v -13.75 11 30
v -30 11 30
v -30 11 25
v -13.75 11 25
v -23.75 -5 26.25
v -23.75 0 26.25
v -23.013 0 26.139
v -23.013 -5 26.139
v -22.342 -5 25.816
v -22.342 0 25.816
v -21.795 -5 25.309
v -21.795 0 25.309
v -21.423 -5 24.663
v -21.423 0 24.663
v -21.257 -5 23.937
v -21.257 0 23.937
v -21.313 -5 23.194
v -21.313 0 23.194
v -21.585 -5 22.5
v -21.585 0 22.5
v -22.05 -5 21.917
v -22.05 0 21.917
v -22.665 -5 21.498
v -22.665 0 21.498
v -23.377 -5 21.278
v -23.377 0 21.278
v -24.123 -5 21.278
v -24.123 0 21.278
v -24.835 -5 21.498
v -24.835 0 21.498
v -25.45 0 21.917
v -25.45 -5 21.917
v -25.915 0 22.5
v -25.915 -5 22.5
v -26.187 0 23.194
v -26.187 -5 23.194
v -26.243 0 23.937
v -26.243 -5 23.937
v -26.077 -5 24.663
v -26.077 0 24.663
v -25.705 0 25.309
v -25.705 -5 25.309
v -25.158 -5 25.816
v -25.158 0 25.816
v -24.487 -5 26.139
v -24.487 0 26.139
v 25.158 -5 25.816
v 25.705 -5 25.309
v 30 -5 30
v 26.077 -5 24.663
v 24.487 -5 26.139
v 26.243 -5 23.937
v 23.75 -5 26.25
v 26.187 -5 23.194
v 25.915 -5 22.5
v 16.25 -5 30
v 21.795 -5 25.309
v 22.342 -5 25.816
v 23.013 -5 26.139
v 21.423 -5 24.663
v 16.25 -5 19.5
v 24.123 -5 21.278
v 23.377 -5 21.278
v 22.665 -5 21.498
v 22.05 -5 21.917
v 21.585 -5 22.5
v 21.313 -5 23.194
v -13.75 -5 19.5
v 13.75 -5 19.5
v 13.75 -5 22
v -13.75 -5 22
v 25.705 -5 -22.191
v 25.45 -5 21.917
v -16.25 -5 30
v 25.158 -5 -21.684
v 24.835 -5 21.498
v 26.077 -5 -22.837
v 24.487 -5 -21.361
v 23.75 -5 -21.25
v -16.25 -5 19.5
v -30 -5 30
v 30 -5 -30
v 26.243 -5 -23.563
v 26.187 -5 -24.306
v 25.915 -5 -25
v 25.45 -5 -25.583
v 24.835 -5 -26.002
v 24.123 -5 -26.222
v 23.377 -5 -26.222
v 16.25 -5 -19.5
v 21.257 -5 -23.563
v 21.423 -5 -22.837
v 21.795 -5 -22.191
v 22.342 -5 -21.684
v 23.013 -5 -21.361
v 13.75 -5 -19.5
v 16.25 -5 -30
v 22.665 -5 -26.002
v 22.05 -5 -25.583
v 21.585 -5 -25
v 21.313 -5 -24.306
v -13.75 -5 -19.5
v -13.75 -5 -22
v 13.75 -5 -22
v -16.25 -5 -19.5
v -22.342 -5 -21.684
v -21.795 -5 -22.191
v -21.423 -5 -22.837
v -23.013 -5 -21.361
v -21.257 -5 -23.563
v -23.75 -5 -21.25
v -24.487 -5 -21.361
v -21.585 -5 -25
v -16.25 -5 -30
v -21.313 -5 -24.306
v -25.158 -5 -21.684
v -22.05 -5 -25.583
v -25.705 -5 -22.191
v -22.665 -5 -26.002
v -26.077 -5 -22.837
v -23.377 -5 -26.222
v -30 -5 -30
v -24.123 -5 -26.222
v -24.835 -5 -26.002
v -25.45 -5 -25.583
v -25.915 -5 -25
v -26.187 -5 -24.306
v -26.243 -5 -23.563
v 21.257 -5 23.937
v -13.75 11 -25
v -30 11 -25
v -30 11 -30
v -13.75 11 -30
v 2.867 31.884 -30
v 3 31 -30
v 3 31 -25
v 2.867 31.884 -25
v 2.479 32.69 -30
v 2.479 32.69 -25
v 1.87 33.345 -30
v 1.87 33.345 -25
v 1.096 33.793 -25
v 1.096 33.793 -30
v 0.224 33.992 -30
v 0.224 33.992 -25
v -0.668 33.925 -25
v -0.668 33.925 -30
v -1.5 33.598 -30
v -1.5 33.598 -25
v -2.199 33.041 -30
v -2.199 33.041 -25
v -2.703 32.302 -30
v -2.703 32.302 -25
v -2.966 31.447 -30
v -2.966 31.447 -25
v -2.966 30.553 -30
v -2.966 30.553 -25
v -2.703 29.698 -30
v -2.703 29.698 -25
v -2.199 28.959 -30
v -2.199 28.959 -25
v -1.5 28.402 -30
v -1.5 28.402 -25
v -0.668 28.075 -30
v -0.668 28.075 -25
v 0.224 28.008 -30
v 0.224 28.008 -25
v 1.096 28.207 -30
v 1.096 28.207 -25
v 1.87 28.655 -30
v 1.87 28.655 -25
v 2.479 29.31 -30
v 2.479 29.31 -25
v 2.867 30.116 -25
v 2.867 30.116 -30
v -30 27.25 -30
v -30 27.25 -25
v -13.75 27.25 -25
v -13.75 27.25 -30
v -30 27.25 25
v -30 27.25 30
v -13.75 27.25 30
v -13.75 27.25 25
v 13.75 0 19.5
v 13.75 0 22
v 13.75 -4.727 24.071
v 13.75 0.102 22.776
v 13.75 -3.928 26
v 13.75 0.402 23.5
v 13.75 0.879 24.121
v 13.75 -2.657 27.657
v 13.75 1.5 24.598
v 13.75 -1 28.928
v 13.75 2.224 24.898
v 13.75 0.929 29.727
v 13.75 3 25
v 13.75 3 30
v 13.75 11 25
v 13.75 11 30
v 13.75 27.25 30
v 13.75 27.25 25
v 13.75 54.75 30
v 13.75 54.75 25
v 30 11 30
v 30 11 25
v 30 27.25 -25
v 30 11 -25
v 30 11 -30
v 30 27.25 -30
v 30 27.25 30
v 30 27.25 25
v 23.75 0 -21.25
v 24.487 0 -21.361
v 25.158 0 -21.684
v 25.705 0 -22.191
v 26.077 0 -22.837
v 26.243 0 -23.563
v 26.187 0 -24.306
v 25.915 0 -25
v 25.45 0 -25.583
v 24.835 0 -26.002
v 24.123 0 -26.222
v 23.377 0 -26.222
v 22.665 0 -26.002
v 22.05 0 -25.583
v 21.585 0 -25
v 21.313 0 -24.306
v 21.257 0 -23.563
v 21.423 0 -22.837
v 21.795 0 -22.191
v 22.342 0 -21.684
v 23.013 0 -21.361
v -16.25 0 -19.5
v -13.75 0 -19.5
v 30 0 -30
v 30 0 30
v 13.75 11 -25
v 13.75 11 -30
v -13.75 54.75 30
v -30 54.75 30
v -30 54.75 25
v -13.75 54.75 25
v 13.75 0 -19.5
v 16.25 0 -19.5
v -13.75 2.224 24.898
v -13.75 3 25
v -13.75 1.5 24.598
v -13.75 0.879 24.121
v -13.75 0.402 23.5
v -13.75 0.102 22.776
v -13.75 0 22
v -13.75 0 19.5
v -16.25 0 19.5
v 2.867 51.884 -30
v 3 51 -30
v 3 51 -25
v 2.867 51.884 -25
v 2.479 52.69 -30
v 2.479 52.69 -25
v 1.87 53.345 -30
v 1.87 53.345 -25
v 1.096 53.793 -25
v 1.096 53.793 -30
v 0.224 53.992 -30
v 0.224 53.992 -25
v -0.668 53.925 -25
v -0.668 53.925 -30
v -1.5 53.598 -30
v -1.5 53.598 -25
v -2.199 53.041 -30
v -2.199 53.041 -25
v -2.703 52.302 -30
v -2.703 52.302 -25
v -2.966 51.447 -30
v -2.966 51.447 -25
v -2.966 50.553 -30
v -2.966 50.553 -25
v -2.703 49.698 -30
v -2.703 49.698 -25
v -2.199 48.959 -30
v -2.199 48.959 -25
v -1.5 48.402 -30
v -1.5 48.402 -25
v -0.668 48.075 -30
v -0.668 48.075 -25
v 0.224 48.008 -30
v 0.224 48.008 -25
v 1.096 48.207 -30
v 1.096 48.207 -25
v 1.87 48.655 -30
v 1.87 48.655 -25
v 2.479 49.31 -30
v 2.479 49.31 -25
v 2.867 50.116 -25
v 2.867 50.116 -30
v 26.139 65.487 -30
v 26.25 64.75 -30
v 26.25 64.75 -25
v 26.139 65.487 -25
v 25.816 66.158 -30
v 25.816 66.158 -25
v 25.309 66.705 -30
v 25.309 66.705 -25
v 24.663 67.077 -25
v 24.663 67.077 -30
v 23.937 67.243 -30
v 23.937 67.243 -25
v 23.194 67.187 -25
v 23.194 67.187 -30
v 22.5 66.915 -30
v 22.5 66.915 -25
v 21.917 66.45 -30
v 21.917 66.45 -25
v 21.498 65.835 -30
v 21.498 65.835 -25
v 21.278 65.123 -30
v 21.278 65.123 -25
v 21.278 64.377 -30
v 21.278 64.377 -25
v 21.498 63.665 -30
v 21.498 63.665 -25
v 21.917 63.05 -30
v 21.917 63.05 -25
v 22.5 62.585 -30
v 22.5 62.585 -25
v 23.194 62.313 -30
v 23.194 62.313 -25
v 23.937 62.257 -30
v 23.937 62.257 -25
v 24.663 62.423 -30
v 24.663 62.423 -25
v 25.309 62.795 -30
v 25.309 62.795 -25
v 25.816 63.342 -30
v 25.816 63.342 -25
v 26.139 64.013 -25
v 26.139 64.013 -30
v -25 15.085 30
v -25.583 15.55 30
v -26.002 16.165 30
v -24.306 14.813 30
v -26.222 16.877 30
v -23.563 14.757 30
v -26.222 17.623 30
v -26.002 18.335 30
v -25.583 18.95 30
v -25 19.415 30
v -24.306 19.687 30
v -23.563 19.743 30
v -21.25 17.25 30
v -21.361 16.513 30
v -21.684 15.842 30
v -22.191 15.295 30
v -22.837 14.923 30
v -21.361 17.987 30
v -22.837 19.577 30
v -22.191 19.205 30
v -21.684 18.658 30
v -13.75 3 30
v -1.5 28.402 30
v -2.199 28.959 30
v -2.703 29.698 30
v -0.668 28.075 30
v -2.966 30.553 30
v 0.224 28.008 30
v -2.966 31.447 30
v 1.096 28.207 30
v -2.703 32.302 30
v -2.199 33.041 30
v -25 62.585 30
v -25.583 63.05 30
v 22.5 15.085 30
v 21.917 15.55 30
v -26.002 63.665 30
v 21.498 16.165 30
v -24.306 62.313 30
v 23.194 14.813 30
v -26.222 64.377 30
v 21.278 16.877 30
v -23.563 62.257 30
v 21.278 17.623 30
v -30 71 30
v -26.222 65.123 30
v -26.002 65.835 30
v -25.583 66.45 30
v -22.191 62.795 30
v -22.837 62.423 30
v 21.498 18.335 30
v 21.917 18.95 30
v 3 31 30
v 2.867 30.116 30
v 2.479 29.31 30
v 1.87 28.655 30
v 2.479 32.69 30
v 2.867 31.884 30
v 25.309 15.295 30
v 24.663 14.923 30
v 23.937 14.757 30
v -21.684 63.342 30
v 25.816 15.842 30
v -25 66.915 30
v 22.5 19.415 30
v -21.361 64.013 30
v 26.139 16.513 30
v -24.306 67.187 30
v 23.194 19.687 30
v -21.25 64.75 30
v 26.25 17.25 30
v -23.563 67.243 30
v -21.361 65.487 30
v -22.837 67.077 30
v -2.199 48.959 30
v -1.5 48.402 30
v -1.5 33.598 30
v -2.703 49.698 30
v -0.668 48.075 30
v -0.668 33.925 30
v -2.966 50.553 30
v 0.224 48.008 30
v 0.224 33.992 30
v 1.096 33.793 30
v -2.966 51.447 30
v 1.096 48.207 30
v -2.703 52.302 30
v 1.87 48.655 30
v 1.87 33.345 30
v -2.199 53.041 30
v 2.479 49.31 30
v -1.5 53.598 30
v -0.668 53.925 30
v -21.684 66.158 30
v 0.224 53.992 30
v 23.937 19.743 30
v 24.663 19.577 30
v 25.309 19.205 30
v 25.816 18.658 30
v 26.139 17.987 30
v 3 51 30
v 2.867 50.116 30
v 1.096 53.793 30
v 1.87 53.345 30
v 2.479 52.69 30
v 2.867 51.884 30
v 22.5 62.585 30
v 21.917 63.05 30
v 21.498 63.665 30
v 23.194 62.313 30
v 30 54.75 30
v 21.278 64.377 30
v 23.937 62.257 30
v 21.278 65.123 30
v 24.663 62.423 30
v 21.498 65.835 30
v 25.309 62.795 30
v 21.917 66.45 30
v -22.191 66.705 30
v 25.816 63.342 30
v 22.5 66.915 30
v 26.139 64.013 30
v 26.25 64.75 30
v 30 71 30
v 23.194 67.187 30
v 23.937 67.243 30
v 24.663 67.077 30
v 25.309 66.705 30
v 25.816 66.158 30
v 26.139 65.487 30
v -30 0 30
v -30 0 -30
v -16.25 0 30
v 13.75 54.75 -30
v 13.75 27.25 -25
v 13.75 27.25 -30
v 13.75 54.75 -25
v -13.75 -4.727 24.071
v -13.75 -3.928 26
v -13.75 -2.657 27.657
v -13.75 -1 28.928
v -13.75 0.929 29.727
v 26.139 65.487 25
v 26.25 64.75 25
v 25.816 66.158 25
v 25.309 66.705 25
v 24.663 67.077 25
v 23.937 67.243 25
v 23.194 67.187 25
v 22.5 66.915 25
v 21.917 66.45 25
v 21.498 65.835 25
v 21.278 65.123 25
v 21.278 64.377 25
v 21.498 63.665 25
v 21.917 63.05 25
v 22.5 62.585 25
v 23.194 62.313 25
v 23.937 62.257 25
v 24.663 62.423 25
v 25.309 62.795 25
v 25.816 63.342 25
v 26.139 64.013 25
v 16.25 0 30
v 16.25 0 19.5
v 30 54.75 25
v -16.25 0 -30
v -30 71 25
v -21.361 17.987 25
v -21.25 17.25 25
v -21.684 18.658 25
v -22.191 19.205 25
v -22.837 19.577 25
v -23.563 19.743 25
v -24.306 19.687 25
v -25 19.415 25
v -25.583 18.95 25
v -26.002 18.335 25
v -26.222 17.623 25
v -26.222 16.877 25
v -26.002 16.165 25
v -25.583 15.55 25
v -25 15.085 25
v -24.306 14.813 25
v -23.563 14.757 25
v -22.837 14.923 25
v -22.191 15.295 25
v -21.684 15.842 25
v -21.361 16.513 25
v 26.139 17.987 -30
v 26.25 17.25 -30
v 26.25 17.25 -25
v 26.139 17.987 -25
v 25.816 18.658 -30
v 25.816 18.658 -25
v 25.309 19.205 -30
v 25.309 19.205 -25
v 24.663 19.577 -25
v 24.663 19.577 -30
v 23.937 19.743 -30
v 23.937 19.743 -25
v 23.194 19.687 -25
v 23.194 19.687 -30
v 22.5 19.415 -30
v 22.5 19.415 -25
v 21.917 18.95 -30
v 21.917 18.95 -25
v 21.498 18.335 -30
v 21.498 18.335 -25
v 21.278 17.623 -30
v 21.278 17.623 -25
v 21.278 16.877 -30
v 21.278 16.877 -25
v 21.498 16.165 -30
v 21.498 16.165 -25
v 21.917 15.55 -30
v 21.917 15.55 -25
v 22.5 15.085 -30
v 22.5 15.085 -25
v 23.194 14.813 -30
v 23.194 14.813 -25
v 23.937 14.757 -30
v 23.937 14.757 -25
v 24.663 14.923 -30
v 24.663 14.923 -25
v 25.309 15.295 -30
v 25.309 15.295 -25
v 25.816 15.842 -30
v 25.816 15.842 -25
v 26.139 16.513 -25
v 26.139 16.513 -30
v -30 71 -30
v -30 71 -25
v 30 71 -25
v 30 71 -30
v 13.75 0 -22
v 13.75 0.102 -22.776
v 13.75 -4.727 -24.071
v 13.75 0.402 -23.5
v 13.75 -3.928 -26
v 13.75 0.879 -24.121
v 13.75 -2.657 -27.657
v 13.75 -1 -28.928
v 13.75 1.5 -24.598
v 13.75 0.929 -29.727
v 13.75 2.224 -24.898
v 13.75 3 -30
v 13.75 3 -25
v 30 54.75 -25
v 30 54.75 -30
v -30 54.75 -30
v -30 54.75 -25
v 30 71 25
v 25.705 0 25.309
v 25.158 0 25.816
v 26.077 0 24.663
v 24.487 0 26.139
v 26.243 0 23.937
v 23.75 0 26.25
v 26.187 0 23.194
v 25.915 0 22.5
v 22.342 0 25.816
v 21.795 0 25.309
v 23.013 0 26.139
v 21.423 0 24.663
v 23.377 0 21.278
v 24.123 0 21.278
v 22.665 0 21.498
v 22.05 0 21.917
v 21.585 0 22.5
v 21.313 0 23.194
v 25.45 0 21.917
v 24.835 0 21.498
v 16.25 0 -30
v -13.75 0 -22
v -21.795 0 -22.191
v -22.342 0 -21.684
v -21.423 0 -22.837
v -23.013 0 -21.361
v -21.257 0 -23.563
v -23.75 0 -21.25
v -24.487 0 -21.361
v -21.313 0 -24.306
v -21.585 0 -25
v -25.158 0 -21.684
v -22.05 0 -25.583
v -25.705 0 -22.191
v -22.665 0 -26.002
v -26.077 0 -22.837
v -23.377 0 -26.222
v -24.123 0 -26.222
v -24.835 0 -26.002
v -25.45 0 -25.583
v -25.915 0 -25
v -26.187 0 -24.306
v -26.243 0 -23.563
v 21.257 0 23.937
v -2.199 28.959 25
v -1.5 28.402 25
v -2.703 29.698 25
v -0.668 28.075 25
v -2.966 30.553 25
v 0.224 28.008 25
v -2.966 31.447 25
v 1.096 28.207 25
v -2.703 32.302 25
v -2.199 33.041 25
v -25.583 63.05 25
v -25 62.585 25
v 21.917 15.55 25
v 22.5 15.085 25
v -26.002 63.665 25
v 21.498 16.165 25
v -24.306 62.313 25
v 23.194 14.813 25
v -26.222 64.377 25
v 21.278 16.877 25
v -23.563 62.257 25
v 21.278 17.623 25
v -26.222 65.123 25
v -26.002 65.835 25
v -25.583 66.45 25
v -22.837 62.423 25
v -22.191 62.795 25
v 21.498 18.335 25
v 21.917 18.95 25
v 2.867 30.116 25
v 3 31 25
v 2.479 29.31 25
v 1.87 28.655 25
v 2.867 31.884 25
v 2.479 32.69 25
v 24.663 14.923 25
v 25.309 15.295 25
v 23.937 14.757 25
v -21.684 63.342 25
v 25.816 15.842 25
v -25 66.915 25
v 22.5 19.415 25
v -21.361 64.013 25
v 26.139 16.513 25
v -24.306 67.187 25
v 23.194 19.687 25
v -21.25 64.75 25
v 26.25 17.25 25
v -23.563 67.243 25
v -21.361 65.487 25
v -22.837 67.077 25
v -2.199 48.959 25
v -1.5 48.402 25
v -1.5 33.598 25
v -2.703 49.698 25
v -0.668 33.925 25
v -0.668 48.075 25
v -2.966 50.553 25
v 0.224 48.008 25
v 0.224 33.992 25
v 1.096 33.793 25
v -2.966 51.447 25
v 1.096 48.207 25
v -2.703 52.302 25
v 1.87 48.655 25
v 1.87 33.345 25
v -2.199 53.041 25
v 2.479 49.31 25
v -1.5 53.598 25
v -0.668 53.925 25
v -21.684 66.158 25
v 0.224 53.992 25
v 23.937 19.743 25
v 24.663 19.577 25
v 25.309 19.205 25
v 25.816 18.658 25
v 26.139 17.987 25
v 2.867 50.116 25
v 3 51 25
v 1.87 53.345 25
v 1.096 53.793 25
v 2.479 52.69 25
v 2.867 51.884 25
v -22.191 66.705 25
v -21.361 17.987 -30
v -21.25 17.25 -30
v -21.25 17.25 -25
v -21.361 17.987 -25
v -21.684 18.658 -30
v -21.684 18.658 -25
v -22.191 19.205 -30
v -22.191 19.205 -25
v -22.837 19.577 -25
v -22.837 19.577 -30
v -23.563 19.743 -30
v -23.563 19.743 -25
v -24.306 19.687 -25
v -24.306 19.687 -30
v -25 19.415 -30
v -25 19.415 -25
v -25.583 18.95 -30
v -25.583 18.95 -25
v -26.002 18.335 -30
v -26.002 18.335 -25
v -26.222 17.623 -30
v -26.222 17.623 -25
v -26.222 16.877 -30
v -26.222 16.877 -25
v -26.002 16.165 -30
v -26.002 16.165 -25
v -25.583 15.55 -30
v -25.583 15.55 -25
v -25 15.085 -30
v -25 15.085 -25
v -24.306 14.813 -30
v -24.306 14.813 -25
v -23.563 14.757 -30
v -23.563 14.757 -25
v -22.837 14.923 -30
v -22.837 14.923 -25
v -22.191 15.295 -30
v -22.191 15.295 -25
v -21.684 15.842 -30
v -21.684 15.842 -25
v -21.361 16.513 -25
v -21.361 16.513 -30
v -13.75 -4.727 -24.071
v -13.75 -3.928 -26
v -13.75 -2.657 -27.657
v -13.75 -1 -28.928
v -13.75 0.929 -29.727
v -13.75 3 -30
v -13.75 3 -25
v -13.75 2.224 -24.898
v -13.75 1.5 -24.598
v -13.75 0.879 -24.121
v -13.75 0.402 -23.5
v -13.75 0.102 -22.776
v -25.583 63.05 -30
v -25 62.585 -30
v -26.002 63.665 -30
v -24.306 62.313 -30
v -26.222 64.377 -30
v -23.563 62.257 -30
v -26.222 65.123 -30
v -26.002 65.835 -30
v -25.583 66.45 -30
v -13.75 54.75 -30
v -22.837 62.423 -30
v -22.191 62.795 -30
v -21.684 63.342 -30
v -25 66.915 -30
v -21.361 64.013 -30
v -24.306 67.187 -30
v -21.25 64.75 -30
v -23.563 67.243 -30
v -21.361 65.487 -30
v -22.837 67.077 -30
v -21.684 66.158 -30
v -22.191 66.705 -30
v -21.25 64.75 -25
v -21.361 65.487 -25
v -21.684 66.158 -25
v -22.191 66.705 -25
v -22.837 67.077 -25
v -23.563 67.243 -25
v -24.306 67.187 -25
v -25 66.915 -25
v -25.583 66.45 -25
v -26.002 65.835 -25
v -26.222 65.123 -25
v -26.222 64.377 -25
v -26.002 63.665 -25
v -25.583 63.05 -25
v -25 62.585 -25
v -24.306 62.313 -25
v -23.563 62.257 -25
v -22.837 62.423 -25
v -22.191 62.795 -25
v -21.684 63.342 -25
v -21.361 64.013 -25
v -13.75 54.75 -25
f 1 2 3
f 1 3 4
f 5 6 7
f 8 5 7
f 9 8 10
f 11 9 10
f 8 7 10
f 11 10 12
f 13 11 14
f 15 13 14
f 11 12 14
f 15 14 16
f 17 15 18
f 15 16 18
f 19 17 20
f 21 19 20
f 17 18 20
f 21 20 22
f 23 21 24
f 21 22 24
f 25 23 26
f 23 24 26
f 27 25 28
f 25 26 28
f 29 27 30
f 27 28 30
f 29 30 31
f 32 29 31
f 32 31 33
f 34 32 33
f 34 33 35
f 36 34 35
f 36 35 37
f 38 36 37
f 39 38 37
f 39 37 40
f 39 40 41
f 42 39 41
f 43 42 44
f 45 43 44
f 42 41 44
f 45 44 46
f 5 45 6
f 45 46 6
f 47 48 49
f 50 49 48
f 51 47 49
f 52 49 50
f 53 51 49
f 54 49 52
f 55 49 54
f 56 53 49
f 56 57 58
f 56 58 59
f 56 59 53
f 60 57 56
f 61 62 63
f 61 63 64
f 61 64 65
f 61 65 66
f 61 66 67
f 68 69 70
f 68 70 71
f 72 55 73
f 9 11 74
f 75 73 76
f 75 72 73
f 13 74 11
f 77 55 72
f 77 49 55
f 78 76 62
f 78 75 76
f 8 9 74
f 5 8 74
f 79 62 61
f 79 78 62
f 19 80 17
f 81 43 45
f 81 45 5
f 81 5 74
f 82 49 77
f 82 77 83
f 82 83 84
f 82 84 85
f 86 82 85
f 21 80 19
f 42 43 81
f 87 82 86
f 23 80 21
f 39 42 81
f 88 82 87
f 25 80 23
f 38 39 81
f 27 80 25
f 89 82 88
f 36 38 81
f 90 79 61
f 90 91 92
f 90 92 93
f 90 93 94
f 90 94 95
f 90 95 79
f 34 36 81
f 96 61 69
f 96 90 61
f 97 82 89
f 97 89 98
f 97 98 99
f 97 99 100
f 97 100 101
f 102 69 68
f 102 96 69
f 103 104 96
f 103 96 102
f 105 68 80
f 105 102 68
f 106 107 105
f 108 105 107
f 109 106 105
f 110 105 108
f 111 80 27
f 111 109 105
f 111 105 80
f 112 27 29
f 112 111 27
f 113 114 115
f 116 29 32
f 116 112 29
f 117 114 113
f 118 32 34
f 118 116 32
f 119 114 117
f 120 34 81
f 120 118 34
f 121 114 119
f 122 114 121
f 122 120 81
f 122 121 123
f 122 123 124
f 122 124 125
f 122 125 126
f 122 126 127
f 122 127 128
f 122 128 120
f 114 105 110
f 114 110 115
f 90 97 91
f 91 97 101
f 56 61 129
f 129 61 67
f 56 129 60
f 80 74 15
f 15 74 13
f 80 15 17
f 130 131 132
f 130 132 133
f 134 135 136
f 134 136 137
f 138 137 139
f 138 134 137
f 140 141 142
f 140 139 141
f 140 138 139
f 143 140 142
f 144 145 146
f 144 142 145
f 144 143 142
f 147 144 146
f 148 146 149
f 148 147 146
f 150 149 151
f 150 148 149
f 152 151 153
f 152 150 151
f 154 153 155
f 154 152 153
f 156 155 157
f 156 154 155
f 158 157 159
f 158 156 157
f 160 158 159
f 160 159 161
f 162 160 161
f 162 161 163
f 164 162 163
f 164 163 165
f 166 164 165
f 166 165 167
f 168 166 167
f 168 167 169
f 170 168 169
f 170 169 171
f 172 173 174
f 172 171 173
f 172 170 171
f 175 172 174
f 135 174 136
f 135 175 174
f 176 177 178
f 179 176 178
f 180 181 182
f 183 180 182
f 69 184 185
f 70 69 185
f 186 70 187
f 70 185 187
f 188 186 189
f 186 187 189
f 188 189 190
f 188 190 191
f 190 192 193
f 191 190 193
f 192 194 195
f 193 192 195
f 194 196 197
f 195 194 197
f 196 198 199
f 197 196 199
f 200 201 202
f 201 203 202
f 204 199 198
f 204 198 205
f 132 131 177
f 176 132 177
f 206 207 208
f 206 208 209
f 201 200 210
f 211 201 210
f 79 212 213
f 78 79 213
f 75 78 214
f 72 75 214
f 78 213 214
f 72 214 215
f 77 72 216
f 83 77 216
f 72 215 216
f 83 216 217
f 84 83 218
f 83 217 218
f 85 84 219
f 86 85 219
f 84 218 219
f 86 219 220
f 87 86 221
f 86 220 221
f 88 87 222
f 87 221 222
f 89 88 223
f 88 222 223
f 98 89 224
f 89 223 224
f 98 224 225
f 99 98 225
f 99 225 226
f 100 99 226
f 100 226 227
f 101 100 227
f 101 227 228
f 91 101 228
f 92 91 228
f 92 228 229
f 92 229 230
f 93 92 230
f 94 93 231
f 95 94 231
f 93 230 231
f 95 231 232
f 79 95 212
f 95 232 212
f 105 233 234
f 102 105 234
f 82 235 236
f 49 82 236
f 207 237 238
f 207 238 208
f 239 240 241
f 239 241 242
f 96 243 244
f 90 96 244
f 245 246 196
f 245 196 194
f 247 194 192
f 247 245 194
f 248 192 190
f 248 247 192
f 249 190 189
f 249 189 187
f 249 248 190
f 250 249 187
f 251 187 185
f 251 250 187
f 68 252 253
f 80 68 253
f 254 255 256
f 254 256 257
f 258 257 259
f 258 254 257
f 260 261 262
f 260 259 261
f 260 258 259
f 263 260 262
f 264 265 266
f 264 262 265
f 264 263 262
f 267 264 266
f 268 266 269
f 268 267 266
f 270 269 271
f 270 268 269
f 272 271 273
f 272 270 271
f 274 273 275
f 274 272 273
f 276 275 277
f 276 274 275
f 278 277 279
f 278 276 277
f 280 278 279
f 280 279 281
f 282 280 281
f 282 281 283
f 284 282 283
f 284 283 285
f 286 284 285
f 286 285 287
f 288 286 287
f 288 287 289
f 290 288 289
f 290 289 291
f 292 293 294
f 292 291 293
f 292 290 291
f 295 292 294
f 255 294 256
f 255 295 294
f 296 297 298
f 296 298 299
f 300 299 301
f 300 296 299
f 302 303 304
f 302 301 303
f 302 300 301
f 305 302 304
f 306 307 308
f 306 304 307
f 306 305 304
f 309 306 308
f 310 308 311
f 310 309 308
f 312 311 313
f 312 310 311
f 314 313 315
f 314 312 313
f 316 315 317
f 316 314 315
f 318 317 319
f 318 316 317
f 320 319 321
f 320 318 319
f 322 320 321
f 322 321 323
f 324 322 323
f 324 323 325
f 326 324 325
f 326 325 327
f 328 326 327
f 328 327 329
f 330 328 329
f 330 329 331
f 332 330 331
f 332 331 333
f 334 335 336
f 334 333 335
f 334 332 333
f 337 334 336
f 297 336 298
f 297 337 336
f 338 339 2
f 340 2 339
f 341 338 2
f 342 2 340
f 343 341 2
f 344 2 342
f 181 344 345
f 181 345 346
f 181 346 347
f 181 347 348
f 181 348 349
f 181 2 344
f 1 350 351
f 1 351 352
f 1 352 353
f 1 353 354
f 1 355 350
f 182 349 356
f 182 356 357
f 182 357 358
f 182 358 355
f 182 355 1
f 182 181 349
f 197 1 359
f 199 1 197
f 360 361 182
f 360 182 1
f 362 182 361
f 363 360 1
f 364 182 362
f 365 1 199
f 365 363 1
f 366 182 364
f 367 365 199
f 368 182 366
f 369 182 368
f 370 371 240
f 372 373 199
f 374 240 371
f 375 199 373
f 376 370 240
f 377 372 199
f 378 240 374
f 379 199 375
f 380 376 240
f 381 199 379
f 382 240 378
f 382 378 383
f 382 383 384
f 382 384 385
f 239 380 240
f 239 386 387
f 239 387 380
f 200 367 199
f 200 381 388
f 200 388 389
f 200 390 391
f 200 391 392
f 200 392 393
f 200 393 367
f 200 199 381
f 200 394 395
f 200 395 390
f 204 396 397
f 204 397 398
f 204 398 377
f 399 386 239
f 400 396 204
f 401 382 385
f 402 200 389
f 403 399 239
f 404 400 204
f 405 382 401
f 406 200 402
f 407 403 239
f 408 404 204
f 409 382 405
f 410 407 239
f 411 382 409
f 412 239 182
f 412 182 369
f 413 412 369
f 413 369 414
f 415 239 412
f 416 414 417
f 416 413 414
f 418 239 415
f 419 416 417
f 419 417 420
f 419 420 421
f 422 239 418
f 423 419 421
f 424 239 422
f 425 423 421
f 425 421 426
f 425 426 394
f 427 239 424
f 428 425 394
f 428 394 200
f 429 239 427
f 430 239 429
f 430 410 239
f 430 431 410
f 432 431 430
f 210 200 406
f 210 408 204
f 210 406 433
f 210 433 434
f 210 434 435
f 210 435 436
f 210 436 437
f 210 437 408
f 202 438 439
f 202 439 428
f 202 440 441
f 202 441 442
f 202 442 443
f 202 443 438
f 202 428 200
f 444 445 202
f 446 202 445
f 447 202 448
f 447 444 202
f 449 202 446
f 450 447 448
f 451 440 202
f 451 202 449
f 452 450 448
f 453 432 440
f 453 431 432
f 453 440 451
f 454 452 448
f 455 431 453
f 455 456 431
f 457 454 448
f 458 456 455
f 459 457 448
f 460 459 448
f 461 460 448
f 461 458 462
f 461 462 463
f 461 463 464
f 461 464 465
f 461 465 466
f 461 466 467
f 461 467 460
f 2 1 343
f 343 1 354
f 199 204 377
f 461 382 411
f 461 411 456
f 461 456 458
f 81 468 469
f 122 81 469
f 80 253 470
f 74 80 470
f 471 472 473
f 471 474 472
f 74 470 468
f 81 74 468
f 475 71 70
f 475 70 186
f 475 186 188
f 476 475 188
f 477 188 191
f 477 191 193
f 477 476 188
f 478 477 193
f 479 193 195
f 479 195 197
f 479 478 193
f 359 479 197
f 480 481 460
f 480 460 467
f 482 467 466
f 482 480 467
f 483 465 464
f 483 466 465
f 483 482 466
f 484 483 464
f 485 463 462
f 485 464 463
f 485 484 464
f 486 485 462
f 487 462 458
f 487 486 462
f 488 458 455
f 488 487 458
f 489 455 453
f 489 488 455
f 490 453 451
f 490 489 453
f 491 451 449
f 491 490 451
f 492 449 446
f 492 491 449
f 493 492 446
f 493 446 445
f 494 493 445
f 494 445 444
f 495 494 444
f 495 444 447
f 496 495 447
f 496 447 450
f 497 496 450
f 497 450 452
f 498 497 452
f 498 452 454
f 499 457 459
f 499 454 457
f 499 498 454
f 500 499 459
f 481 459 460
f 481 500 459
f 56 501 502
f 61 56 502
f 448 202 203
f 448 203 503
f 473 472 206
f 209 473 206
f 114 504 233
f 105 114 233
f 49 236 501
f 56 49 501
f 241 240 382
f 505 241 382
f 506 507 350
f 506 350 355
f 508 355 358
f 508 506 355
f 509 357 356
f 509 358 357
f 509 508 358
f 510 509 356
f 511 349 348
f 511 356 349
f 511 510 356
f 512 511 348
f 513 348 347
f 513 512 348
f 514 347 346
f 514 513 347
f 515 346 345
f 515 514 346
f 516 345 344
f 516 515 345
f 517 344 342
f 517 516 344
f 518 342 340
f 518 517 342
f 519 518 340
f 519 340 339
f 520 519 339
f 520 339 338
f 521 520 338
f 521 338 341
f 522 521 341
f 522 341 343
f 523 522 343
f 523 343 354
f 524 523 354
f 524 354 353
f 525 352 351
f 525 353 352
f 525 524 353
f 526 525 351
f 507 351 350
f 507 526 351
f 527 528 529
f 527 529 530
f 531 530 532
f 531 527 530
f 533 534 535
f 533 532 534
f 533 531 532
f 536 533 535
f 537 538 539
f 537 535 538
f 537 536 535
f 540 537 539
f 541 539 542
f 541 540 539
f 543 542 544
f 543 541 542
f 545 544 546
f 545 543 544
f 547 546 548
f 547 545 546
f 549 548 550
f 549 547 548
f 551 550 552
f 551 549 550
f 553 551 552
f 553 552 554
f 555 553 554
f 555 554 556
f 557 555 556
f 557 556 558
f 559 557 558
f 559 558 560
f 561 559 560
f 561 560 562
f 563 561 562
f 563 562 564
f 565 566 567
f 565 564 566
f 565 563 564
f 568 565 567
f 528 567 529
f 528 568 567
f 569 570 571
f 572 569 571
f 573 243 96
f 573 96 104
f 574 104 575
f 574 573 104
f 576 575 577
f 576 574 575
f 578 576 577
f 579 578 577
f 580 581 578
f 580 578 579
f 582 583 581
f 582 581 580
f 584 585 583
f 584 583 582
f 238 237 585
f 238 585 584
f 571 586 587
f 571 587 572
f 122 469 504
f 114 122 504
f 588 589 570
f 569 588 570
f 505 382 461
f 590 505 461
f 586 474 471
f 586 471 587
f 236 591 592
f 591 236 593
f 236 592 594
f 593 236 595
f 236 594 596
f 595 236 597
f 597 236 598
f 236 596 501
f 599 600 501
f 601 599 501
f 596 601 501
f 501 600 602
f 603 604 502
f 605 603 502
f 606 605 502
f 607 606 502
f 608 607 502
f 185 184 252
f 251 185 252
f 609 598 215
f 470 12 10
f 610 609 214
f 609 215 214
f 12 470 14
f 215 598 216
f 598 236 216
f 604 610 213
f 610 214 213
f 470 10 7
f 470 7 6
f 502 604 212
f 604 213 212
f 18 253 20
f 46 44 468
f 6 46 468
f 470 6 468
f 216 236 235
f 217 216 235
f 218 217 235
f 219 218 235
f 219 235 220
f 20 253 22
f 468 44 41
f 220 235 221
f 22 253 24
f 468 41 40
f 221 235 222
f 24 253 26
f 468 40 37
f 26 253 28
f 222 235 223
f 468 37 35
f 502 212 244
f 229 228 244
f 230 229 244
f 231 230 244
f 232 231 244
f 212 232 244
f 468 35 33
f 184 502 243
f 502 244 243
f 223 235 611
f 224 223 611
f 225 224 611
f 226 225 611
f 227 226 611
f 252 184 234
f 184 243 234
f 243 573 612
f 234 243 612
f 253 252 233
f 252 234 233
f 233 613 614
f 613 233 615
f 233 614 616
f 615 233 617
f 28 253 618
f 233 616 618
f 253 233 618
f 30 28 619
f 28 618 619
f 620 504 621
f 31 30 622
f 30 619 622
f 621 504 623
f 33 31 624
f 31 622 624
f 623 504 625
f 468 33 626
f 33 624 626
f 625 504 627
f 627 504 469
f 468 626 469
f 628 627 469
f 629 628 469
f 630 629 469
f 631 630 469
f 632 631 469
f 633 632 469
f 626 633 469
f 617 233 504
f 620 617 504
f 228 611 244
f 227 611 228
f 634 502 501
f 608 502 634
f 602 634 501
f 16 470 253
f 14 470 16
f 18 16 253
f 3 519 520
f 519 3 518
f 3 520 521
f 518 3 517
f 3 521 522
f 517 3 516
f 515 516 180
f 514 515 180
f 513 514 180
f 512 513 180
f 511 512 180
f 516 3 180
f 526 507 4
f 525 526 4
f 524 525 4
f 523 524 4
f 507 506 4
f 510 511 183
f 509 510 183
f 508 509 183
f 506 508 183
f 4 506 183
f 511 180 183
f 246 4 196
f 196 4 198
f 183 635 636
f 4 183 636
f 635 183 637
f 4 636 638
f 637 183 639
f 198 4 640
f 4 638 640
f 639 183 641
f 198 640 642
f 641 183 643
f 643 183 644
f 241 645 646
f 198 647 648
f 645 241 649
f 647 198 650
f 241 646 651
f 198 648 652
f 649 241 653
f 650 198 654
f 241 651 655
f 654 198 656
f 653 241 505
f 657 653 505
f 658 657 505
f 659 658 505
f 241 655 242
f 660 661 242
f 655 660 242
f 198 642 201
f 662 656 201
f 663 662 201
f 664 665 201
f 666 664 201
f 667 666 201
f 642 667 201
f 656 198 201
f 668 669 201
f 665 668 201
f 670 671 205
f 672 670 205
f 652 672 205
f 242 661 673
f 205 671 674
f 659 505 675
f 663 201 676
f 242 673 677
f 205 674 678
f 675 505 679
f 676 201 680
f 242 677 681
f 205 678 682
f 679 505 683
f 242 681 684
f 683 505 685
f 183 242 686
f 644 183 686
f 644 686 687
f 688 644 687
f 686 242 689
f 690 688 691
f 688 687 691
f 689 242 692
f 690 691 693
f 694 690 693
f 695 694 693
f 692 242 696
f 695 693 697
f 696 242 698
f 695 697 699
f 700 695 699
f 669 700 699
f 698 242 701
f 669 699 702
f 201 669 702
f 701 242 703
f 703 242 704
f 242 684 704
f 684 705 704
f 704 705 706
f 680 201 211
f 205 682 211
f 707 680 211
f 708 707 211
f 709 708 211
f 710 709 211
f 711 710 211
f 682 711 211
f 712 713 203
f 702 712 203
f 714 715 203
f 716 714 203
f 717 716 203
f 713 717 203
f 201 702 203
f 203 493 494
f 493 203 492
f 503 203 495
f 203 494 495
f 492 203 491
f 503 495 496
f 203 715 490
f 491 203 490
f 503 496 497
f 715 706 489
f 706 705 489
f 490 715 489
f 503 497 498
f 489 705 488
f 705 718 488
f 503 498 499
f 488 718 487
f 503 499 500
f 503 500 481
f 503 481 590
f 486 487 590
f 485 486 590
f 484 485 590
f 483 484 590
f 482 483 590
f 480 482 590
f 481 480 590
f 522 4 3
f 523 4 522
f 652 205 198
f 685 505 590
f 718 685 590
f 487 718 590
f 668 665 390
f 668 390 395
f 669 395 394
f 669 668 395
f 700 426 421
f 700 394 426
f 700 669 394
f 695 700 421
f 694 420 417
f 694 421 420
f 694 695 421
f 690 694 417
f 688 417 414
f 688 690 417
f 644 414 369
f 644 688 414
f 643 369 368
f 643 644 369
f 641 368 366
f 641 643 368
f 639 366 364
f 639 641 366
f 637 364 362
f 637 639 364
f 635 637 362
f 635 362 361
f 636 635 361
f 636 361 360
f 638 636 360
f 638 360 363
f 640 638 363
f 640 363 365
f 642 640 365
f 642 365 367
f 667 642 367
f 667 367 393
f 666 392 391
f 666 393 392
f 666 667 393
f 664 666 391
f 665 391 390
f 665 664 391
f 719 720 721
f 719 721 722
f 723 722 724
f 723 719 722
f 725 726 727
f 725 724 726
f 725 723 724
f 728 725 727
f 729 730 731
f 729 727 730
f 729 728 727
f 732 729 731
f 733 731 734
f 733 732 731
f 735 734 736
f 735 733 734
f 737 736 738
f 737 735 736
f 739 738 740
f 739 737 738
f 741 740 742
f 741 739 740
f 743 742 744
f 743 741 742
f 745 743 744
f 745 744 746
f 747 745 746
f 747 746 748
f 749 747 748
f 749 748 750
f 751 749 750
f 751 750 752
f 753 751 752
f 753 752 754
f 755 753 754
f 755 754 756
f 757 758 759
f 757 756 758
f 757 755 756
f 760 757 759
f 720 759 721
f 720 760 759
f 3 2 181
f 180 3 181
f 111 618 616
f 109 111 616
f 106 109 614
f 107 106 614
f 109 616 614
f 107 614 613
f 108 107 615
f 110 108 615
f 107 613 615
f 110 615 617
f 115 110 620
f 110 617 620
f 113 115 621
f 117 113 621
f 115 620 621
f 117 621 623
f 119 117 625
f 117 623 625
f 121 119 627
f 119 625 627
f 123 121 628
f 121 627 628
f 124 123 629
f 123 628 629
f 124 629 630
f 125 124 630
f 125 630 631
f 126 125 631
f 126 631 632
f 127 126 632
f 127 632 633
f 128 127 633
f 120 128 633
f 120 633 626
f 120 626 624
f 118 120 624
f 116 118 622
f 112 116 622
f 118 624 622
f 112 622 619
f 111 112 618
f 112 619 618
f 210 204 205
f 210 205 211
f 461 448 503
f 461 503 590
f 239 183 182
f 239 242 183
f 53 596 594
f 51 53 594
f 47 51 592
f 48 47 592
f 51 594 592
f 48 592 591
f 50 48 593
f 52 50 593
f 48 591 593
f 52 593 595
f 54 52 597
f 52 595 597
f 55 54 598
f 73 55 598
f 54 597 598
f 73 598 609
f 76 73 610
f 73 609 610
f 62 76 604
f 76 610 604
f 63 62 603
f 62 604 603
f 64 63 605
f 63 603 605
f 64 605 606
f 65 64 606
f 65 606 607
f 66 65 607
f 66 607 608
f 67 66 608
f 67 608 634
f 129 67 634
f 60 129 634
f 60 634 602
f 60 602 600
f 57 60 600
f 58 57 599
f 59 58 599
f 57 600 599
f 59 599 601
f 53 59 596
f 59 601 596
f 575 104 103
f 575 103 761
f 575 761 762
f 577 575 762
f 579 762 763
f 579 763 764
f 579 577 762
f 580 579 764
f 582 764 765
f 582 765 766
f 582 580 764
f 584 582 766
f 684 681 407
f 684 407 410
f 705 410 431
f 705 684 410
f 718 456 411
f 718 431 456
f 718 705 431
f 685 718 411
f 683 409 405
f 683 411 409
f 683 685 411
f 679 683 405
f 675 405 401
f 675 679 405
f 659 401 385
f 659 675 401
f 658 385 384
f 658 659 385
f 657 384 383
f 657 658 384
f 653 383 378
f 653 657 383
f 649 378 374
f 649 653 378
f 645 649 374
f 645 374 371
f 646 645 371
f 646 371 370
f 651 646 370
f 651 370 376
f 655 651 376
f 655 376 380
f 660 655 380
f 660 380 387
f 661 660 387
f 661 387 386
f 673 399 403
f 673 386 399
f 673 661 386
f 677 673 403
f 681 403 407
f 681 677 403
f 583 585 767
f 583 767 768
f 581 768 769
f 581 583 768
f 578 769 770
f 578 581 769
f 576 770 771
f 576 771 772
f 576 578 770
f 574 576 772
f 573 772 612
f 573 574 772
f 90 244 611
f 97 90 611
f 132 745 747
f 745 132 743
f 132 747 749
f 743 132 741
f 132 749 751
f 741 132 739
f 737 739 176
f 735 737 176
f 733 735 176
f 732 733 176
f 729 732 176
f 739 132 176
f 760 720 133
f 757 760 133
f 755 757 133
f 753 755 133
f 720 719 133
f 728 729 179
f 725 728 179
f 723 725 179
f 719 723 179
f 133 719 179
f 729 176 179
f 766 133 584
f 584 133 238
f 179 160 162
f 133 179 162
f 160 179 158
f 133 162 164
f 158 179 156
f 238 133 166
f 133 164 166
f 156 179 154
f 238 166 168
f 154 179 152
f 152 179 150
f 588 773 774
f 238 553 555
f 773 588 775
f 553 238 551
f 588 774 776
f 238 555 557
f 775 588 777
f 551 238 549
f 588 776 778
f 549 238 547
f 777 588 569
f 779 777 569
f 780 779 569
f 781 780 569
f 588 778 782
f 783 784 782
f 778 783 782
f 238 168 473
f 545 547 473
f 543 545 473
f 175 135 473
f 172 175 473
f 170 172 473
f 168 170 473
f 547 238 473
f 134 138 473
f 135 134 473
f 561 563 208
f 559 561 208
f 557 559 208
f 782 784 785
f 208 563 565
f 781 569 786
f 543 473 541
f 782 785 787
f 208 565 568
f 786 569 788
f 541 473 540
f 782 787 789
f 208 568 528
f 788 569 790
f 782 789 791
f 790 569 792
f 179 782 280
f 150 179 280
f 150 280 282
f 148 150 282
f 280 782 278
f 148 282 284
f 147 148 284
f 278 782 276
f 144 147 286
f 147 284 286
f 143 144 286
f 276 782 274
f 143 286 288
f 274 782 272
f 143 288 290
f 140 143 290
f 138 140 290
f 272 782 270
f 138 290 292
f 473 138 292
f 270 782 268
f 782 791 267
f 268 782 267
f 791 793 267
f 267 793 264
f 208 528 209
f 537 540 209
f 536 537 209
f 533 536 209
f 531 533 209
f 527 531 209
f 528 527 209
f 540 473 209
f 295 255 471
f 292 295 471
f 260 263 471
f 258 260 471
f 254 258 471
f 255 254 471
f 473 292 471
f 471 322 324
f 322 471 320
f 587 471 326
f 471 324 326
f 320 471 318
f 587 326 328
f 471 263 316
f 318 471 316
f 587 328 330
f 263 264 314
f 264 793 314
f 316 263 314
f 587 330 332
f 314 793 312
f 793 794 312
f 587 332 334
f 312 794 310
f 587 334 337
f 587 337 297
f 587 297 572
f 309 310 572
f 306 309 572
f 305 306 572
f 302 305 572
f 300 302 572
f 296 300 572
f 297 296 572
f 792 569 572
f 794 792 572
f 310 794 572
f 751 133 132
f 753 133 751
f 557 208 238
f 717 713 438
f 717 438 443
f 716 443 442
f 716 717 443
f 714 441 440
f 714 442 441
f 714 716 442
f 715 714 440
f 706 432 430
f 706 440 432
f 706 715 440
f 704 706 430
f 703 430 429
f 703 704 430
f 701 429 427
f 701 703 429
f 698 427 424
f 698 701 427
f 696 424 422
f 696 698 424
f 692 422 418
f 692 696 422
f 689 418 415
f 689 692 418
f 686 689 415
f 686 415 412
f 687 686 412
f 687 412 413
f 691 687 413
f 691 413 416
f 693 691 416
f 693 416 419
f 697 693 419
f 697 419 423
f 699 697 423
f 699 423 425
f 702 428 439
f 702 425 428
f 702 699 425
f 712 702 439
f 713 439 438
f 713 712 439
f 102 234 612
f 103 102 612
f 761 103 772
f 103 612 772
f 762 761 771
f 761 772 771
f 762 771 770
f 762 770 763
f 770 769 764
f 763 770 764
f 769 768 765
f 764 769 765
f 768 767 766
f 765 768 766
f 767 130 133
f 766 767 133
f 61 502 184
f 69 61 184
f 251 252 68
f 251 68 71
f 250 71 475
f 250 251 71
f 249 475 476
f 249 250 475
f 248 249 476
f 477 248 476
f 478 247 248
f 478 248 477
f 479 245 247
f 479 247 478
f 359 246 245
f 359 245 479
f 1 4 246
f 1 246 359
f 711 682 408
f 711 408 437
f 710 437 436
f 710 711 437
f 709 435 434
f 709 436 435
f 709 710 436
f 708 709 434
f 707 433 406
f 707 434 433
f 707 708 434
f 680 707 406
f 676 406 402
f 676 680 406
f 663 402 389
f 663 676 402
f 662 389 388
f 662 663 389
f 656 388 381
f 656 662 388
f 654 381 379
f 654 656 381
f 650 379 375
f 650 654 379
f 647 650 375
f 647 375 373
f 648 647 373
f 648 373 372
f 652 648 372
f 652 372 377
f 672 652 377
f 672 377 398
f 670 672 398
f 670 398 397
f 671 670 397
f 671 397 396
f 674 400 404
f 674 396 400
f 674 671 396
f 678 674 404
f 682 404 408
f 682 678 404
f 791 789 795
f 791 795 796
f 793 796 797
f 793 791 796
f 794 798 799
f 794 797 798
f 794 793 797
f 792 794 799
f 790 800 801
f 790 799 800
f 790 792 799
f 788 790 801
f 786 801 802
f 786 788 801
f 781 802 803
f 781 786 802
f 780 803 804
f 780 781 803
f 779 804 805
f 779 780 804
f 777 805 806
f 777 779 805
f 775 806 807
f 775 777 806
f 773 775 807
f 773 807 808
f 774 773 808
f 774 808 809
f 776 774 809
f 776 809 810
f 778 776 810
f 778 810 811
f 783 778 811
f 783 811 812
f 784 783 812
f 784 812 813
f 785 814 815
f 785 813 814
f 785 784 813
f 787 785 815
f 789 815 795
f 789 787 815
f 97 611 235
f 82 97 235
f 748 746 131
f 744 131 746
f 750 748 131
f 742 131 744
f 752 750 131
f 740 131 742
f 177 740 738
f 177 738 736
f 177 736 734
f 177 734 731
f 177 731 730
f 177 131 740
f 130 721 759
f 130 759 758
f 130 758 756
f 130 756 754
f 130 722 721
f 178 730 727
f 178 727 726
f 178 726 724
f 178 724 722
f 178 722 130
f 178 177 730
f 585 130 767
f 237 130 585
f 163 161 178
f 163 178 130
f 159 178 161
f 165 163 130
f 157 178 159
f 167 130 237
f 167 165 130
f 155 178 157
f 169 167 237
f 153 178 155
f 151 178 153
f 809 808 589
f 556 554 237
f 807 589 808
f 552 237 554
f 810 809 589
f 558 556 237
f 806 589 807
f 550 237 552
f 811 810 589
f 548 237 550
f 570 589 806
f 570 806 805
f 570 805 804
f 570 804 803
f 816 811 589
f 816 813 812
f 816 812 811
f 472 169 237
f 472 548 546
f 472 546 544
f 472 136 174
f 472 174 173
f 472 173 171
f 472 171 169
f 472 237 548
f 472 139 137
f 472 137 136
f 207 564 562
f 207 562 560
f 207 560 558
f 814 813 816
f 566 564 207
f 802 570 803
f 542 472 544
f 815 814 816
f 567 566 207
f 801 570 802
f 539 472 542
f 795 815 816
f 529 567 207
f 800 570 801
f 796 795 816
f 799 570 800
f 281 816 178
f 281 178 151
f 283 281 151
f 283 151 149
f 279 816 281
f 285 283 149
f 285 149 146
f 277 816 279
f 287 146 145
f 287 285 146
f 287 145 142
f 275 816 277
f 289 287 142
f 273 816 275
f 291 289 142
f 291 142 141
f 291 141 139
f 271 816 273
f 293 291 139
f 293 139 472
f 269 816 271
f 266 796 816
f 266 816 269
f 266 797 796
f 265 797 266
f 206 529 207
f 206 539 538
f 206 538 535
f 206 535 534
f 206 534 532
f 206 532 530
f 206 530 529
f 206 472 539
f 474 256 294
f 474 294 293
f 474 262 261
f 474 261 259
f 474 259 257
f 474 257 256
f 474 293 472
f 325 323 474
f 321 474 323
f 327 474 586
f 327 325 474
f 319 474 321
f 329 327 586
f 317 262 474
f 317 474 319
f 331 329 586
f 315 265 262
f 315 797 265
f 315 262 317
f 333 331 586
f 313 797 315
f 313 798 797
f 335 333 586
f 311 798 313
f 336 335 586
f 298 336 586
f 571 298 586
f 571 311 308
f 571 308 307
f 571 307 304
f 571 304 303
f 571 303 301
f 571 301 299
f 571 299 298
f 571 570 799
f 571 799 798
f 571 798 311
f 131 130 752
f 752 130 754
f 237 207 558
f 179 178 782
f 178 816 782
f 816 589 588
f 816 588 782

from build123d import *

# Parameters (mm, degrees)
SKETCH_16_R                       = 2.5
SM_BASE_FLANGE_2_DEPTH            = 5
SM_EDGE_FLANGE_1_STRIP_W          = 26
SM_EDGE_FLANGE_1_STRIP_H          = 5
SM_EDGE_FLANGE_1_STRIP_CUT_DEPTH  = 27.5
SM_EDGE_FLANGE_1_RELIEF_W         = 28.5
SM_EDGE_FLANGE_1_RELIEF_H         = 2.5
SM_EDGE_FLANGE_1_RELIEF_CUT_DEPTH = 5
SM_EDGE_FLANGE_1_DEPTH            = 27.5
SM_EDGE_FLANGE_2_STRIP_W          = 26
SM_EDGE_FLANGE_2_STRIP_H          = 5
SM_EDGE_FLANGE_2_STRIP_CUT_DEPTH  = 27.5
SM_EDGE_FLANGE_2_RELIEF_W         = 28.5
SM_EDGE_FLANGE_2_RELIEF_H         = 2.5
SM_EDGE_FLANGE_2_RELIEF_CUT_DEPTH = 5
SM_EDGE_FLANGE_2_DEPTH            = 27.5
EXTRUDE_START                     = 30
SKETCH_23_W                       = 16.25
SKETCH_23_H                       = 16.25
EXTRUDE_1_DEPTH                   = 5
EXTRUDE_START_2                   = -25
SKETCH_24_W                       = 16.25
SKETCH_24_H                       = 16.25
EXTRUDE_2_DEPTH                   = 5
CUT_EXTRUDE_1_DEPTH               = 83.710337927
CUT_EXTRUDE_1_DEPTH_BACK          = 83.710337927
SKETCH_25_R                       = 2.5
CUT_EXTRUDE_2_DEPTH               = 83.710337927
CUT_EXTRUDE_2_DEPTH_BACK          = 83.710337927
SKETCH_26_R                       = 3


# Sheet-metal steps are written as plain solids
with BuildPart() as part:
    # 草图16 → 基体-法兰2 (new body)
    with BuildSketch(Plane(origin=(0, 0, 0), x_dir=(1, 0, 0), z_dir=(0, 1, 0))):
        Polygon((16.25, 30), (30, 30), (30, -30), (16.25, -30), (16.25, -25), (-16.25, -25), (-16.25, -30), (-30, -30), (-30, 30), (-16.25, 30), (-16.25, 25), (16.25, 25), align=None)
        with Locations(Location((-23.75, 23.75, 0), (0, 0, 270))):
            Circle(SKETCH_16_R, mode=Mode.SUBTRACT)
        with Locations(Location((-23.75, -23.75, 0), (0, 0, 270))):
            Circle(SKETCH_16_R, mode=Mode.SUBTRACT)
        with Locations(Location((23.75, 23.75, 0), (0, 0, 270))):
            Circle(SKETCH_16_R, mode=Mode.SUBTRACT)
        with Locations(Location((23.75, -23.75, 0), (0, 0, 270))):
            Circle(SKETCH_16_R, mode=Mode.SUBTRACT)
    extrude(amount=-SM_BASE_FLANGE_2_DEPTH)

    # 边线-法兰1 strip (across the edge) → 边线-法兰1 strip cut (cut)
    with BuildSketch(Plane(origin=(-13.75, 0, 25), x_dir=(0, 0, -1), z_dir=(1, 0, 0))):
        with Locations((-10, -2.5)):
            Rectangle(SM_EDGE_FLANGE_1_STRIP_W, SM_EDGE_FLANGE_1_STRIP_H)
    extrude(amount=SM_EDGE_FLANGE_1_STRIP_CUT_DEPTH, mode=Mode.SUBTRACT)

    # 边线-法兰1 relief (on the sheet) → 边线-法兰1 relief cut (cut)
    with BuildSketch(Plane(origin=(-13.75, 0, 22), x_dir=(0, 0, -1), z_dir=(0, 1, 0))):
        with Locations((-11.75, 1.25)):
            Rectangle(SM_EDGE_FLANGE_1_RELIEF_W, SM_EDGE_FLANGE_1_RELIEF_H)
        with Locations((-11.75, -28.75)):
            Rectangle(SM_EDGE_FLANGE_1_RELIEF_W, SM_EDGE_FLANGE_1_RELIEF_H)
    extrude(amount=-SM_EDGE_FLANGE_1_RELIEF_CUT_DEPTH, mode=Mode.SUBTRACT)

    # 边线-法兰1 section (across the edge) → 边线-法兰1 (add)
    with BuildSketch(Plane(origin=(-13.75, 0, 25), x_dir=(0, 0, -1), z_dir=(1, 0, 0))):
        with BuildLine():
            Line((-5, 3), (-5, 71))
            Line((-5, 71), (0, 71))
            Line((0, 71), (0, 3))
            ThreePointArc((0, 3), (0.878679656, 0.878679656), (3, 0))
            Line((3, 0), (3, -5))
            ThreePointArc((3, -5), (-2.656854249, -2.656854249), (-5, 3))
        make_face()
    extrude(amount=SM_EDGE_FLANGE_1_DEPTH)

    # 边线-法兰2 strip (across the edge) → 边线-法兰2 strip cut (cut)
    with BuildSketch(Plane(origin=(13.75, 0, -25), x_dir=(0, 0, 1), z_dir=(-1, 0, 0))):
        with Locations((-10, -2.5)):
            Rectangle(SM_EDGE_FLANGE_2_STRIP_W, SM_EDGE_FLANGE_2_STRIP_H)
    extrude(amount=SM_EDGE_FLANGE_2_STRIP_CUT_DEPTH, mode=Mode.SUBTRACT)

    # 边线-法兰2 relief (on the sheet) → 边线-法兰2 relief cut (cut)
    with BuildSketch(Plane(origin=(13.75, 0, -22), x_dir=(0, 0, 1), z_dir=(0, 1, 0))):
        with Locations((-11.75, 1.25)):
            Rectangle(SM_EDGE_FLANGE_2_RELIEF_W, SM_EDGE_FLANGE_2_RELIEF_H)
        with Locations((-11.75, -28.75)):
            Rectangle(SM_EDGE_FLANGE_2_RELIEF_W, SM_EDGE_FLANGE_2_RELIEF_H)
    extrude(amount=-SM_EDGE_FLANGE_2_RELIEF_CUT_DEPTH, mode=Mode.SUBTRACT)

    # 边线-法兰2 section (across the edge) → 边线-法兰2 (add)
    with BuildSketch(Plane(origin=(13.75, 0, -25), x_dir=(0, 0, 1), z_dir=(-1, 0, 0))):
        with BuildLine():
            Line((-5, 3), (-5, 71))
            Line((-5, 71), (0, 71))
            Line((0, 71), (0, 3))
            ThreePointArc((0, 3), (0.878679656, 0.878679656), (3, 0))
            Line((3, 0), (3, -5))
            ThreePointArc((3, -5), (-2.656854249, -2.656854249), (-5, 3))
        make_face()
    extrude(amount=SM_EDGE_FLANGE_2_DEPTH)

    # 草图23 → 凸台-拉伸1 (add)
    with BuildSketch(Plane.XY.offset(EXTRUDE_START)):
        with Locations((-21.875, 62.875)):
            Rectangle(SKETCH_23_W, SKETCH_23_H)
        with Locations((21.875, 62.875)):
            Rectangle(SKETCH_23_W, SKETCH_23_H)
        with Locations((21.875, 19.125)):
            Rectangle(SKETCH_23_W, SKETCH_23_H)
        with Locations((-21.875, 19.125)):
            Rectangle(SKETCH_23_W, SKETCH_23_H)
    extrude(amount=-EXTRUDE_1_DEPTH)

    # 草图24 → 凸台-拉伸2 (add)
    with BuildSketch(Plane.XY.offset(EXTRUDE_START_2)):
        with Locations((21.875, 62.875)):
            Rectangle(SKETCH_24_W, SKETCH_24_H)
        with Locations((-21.875, 62.875)):
            Rectangle(SKETCH_24_W, SKETCH_24_H)
        with Locations((-21.875, 19.125)):
            Rectangle(SKETCH_24_W, SKETCH_24_H)
        with Locations((21.875, 19.125)):
            Rectangle(SKETCH_24_W, SKETCH_24_H)
    extrude(amount=-EXTRUDE_2_DEPTH)

    # 草图25 → 切除-拉伸1 (cut, two sides: drawn at the far end of the back side and taken through both)
    with BuildSketch(Plane.XY.offset(-CUT_EXTRUDE_1_DEPTH_BACK)):
        with Locations((-23.75, 64.75)):
            Circle(SKETCH_25_R)
        with Locations((23.75, 64.75)):
            Circle(SKETCH_25_R)
        with Locations((-23.75, 17.25)):
            Circle(SKETCH_25_R)
        with Locations((23.75, 17.25)):
            Circle(SKETCH_25_R)
    extrude(amount=CUT_EXTRUDE_1_DEPTH + CUT_EXTRUDE_1_DEPTH_BACK, mode=Mode.SUBTRACT)

    # 草图26 → 切除-拉伸2 (cut, two sides: drawn at the far end of the back side and taken through both)
    with BuildSketch(Plane.XY.offset(-CUT_EXTRUDE_2_DEPTH_BACK)):
        with Locations((0, 51)):
            Circle(SKETCH_26_R)
        with Locations((0, 31)):
            Circle(SKETCH_26_R)
    extrude(amount=CUT_EXTRUDE_2_DEPTH + CUT_EXTRUDE_2_DEPTH_BACK, mode=Mode.SUBTRACT)


solid = part.part
